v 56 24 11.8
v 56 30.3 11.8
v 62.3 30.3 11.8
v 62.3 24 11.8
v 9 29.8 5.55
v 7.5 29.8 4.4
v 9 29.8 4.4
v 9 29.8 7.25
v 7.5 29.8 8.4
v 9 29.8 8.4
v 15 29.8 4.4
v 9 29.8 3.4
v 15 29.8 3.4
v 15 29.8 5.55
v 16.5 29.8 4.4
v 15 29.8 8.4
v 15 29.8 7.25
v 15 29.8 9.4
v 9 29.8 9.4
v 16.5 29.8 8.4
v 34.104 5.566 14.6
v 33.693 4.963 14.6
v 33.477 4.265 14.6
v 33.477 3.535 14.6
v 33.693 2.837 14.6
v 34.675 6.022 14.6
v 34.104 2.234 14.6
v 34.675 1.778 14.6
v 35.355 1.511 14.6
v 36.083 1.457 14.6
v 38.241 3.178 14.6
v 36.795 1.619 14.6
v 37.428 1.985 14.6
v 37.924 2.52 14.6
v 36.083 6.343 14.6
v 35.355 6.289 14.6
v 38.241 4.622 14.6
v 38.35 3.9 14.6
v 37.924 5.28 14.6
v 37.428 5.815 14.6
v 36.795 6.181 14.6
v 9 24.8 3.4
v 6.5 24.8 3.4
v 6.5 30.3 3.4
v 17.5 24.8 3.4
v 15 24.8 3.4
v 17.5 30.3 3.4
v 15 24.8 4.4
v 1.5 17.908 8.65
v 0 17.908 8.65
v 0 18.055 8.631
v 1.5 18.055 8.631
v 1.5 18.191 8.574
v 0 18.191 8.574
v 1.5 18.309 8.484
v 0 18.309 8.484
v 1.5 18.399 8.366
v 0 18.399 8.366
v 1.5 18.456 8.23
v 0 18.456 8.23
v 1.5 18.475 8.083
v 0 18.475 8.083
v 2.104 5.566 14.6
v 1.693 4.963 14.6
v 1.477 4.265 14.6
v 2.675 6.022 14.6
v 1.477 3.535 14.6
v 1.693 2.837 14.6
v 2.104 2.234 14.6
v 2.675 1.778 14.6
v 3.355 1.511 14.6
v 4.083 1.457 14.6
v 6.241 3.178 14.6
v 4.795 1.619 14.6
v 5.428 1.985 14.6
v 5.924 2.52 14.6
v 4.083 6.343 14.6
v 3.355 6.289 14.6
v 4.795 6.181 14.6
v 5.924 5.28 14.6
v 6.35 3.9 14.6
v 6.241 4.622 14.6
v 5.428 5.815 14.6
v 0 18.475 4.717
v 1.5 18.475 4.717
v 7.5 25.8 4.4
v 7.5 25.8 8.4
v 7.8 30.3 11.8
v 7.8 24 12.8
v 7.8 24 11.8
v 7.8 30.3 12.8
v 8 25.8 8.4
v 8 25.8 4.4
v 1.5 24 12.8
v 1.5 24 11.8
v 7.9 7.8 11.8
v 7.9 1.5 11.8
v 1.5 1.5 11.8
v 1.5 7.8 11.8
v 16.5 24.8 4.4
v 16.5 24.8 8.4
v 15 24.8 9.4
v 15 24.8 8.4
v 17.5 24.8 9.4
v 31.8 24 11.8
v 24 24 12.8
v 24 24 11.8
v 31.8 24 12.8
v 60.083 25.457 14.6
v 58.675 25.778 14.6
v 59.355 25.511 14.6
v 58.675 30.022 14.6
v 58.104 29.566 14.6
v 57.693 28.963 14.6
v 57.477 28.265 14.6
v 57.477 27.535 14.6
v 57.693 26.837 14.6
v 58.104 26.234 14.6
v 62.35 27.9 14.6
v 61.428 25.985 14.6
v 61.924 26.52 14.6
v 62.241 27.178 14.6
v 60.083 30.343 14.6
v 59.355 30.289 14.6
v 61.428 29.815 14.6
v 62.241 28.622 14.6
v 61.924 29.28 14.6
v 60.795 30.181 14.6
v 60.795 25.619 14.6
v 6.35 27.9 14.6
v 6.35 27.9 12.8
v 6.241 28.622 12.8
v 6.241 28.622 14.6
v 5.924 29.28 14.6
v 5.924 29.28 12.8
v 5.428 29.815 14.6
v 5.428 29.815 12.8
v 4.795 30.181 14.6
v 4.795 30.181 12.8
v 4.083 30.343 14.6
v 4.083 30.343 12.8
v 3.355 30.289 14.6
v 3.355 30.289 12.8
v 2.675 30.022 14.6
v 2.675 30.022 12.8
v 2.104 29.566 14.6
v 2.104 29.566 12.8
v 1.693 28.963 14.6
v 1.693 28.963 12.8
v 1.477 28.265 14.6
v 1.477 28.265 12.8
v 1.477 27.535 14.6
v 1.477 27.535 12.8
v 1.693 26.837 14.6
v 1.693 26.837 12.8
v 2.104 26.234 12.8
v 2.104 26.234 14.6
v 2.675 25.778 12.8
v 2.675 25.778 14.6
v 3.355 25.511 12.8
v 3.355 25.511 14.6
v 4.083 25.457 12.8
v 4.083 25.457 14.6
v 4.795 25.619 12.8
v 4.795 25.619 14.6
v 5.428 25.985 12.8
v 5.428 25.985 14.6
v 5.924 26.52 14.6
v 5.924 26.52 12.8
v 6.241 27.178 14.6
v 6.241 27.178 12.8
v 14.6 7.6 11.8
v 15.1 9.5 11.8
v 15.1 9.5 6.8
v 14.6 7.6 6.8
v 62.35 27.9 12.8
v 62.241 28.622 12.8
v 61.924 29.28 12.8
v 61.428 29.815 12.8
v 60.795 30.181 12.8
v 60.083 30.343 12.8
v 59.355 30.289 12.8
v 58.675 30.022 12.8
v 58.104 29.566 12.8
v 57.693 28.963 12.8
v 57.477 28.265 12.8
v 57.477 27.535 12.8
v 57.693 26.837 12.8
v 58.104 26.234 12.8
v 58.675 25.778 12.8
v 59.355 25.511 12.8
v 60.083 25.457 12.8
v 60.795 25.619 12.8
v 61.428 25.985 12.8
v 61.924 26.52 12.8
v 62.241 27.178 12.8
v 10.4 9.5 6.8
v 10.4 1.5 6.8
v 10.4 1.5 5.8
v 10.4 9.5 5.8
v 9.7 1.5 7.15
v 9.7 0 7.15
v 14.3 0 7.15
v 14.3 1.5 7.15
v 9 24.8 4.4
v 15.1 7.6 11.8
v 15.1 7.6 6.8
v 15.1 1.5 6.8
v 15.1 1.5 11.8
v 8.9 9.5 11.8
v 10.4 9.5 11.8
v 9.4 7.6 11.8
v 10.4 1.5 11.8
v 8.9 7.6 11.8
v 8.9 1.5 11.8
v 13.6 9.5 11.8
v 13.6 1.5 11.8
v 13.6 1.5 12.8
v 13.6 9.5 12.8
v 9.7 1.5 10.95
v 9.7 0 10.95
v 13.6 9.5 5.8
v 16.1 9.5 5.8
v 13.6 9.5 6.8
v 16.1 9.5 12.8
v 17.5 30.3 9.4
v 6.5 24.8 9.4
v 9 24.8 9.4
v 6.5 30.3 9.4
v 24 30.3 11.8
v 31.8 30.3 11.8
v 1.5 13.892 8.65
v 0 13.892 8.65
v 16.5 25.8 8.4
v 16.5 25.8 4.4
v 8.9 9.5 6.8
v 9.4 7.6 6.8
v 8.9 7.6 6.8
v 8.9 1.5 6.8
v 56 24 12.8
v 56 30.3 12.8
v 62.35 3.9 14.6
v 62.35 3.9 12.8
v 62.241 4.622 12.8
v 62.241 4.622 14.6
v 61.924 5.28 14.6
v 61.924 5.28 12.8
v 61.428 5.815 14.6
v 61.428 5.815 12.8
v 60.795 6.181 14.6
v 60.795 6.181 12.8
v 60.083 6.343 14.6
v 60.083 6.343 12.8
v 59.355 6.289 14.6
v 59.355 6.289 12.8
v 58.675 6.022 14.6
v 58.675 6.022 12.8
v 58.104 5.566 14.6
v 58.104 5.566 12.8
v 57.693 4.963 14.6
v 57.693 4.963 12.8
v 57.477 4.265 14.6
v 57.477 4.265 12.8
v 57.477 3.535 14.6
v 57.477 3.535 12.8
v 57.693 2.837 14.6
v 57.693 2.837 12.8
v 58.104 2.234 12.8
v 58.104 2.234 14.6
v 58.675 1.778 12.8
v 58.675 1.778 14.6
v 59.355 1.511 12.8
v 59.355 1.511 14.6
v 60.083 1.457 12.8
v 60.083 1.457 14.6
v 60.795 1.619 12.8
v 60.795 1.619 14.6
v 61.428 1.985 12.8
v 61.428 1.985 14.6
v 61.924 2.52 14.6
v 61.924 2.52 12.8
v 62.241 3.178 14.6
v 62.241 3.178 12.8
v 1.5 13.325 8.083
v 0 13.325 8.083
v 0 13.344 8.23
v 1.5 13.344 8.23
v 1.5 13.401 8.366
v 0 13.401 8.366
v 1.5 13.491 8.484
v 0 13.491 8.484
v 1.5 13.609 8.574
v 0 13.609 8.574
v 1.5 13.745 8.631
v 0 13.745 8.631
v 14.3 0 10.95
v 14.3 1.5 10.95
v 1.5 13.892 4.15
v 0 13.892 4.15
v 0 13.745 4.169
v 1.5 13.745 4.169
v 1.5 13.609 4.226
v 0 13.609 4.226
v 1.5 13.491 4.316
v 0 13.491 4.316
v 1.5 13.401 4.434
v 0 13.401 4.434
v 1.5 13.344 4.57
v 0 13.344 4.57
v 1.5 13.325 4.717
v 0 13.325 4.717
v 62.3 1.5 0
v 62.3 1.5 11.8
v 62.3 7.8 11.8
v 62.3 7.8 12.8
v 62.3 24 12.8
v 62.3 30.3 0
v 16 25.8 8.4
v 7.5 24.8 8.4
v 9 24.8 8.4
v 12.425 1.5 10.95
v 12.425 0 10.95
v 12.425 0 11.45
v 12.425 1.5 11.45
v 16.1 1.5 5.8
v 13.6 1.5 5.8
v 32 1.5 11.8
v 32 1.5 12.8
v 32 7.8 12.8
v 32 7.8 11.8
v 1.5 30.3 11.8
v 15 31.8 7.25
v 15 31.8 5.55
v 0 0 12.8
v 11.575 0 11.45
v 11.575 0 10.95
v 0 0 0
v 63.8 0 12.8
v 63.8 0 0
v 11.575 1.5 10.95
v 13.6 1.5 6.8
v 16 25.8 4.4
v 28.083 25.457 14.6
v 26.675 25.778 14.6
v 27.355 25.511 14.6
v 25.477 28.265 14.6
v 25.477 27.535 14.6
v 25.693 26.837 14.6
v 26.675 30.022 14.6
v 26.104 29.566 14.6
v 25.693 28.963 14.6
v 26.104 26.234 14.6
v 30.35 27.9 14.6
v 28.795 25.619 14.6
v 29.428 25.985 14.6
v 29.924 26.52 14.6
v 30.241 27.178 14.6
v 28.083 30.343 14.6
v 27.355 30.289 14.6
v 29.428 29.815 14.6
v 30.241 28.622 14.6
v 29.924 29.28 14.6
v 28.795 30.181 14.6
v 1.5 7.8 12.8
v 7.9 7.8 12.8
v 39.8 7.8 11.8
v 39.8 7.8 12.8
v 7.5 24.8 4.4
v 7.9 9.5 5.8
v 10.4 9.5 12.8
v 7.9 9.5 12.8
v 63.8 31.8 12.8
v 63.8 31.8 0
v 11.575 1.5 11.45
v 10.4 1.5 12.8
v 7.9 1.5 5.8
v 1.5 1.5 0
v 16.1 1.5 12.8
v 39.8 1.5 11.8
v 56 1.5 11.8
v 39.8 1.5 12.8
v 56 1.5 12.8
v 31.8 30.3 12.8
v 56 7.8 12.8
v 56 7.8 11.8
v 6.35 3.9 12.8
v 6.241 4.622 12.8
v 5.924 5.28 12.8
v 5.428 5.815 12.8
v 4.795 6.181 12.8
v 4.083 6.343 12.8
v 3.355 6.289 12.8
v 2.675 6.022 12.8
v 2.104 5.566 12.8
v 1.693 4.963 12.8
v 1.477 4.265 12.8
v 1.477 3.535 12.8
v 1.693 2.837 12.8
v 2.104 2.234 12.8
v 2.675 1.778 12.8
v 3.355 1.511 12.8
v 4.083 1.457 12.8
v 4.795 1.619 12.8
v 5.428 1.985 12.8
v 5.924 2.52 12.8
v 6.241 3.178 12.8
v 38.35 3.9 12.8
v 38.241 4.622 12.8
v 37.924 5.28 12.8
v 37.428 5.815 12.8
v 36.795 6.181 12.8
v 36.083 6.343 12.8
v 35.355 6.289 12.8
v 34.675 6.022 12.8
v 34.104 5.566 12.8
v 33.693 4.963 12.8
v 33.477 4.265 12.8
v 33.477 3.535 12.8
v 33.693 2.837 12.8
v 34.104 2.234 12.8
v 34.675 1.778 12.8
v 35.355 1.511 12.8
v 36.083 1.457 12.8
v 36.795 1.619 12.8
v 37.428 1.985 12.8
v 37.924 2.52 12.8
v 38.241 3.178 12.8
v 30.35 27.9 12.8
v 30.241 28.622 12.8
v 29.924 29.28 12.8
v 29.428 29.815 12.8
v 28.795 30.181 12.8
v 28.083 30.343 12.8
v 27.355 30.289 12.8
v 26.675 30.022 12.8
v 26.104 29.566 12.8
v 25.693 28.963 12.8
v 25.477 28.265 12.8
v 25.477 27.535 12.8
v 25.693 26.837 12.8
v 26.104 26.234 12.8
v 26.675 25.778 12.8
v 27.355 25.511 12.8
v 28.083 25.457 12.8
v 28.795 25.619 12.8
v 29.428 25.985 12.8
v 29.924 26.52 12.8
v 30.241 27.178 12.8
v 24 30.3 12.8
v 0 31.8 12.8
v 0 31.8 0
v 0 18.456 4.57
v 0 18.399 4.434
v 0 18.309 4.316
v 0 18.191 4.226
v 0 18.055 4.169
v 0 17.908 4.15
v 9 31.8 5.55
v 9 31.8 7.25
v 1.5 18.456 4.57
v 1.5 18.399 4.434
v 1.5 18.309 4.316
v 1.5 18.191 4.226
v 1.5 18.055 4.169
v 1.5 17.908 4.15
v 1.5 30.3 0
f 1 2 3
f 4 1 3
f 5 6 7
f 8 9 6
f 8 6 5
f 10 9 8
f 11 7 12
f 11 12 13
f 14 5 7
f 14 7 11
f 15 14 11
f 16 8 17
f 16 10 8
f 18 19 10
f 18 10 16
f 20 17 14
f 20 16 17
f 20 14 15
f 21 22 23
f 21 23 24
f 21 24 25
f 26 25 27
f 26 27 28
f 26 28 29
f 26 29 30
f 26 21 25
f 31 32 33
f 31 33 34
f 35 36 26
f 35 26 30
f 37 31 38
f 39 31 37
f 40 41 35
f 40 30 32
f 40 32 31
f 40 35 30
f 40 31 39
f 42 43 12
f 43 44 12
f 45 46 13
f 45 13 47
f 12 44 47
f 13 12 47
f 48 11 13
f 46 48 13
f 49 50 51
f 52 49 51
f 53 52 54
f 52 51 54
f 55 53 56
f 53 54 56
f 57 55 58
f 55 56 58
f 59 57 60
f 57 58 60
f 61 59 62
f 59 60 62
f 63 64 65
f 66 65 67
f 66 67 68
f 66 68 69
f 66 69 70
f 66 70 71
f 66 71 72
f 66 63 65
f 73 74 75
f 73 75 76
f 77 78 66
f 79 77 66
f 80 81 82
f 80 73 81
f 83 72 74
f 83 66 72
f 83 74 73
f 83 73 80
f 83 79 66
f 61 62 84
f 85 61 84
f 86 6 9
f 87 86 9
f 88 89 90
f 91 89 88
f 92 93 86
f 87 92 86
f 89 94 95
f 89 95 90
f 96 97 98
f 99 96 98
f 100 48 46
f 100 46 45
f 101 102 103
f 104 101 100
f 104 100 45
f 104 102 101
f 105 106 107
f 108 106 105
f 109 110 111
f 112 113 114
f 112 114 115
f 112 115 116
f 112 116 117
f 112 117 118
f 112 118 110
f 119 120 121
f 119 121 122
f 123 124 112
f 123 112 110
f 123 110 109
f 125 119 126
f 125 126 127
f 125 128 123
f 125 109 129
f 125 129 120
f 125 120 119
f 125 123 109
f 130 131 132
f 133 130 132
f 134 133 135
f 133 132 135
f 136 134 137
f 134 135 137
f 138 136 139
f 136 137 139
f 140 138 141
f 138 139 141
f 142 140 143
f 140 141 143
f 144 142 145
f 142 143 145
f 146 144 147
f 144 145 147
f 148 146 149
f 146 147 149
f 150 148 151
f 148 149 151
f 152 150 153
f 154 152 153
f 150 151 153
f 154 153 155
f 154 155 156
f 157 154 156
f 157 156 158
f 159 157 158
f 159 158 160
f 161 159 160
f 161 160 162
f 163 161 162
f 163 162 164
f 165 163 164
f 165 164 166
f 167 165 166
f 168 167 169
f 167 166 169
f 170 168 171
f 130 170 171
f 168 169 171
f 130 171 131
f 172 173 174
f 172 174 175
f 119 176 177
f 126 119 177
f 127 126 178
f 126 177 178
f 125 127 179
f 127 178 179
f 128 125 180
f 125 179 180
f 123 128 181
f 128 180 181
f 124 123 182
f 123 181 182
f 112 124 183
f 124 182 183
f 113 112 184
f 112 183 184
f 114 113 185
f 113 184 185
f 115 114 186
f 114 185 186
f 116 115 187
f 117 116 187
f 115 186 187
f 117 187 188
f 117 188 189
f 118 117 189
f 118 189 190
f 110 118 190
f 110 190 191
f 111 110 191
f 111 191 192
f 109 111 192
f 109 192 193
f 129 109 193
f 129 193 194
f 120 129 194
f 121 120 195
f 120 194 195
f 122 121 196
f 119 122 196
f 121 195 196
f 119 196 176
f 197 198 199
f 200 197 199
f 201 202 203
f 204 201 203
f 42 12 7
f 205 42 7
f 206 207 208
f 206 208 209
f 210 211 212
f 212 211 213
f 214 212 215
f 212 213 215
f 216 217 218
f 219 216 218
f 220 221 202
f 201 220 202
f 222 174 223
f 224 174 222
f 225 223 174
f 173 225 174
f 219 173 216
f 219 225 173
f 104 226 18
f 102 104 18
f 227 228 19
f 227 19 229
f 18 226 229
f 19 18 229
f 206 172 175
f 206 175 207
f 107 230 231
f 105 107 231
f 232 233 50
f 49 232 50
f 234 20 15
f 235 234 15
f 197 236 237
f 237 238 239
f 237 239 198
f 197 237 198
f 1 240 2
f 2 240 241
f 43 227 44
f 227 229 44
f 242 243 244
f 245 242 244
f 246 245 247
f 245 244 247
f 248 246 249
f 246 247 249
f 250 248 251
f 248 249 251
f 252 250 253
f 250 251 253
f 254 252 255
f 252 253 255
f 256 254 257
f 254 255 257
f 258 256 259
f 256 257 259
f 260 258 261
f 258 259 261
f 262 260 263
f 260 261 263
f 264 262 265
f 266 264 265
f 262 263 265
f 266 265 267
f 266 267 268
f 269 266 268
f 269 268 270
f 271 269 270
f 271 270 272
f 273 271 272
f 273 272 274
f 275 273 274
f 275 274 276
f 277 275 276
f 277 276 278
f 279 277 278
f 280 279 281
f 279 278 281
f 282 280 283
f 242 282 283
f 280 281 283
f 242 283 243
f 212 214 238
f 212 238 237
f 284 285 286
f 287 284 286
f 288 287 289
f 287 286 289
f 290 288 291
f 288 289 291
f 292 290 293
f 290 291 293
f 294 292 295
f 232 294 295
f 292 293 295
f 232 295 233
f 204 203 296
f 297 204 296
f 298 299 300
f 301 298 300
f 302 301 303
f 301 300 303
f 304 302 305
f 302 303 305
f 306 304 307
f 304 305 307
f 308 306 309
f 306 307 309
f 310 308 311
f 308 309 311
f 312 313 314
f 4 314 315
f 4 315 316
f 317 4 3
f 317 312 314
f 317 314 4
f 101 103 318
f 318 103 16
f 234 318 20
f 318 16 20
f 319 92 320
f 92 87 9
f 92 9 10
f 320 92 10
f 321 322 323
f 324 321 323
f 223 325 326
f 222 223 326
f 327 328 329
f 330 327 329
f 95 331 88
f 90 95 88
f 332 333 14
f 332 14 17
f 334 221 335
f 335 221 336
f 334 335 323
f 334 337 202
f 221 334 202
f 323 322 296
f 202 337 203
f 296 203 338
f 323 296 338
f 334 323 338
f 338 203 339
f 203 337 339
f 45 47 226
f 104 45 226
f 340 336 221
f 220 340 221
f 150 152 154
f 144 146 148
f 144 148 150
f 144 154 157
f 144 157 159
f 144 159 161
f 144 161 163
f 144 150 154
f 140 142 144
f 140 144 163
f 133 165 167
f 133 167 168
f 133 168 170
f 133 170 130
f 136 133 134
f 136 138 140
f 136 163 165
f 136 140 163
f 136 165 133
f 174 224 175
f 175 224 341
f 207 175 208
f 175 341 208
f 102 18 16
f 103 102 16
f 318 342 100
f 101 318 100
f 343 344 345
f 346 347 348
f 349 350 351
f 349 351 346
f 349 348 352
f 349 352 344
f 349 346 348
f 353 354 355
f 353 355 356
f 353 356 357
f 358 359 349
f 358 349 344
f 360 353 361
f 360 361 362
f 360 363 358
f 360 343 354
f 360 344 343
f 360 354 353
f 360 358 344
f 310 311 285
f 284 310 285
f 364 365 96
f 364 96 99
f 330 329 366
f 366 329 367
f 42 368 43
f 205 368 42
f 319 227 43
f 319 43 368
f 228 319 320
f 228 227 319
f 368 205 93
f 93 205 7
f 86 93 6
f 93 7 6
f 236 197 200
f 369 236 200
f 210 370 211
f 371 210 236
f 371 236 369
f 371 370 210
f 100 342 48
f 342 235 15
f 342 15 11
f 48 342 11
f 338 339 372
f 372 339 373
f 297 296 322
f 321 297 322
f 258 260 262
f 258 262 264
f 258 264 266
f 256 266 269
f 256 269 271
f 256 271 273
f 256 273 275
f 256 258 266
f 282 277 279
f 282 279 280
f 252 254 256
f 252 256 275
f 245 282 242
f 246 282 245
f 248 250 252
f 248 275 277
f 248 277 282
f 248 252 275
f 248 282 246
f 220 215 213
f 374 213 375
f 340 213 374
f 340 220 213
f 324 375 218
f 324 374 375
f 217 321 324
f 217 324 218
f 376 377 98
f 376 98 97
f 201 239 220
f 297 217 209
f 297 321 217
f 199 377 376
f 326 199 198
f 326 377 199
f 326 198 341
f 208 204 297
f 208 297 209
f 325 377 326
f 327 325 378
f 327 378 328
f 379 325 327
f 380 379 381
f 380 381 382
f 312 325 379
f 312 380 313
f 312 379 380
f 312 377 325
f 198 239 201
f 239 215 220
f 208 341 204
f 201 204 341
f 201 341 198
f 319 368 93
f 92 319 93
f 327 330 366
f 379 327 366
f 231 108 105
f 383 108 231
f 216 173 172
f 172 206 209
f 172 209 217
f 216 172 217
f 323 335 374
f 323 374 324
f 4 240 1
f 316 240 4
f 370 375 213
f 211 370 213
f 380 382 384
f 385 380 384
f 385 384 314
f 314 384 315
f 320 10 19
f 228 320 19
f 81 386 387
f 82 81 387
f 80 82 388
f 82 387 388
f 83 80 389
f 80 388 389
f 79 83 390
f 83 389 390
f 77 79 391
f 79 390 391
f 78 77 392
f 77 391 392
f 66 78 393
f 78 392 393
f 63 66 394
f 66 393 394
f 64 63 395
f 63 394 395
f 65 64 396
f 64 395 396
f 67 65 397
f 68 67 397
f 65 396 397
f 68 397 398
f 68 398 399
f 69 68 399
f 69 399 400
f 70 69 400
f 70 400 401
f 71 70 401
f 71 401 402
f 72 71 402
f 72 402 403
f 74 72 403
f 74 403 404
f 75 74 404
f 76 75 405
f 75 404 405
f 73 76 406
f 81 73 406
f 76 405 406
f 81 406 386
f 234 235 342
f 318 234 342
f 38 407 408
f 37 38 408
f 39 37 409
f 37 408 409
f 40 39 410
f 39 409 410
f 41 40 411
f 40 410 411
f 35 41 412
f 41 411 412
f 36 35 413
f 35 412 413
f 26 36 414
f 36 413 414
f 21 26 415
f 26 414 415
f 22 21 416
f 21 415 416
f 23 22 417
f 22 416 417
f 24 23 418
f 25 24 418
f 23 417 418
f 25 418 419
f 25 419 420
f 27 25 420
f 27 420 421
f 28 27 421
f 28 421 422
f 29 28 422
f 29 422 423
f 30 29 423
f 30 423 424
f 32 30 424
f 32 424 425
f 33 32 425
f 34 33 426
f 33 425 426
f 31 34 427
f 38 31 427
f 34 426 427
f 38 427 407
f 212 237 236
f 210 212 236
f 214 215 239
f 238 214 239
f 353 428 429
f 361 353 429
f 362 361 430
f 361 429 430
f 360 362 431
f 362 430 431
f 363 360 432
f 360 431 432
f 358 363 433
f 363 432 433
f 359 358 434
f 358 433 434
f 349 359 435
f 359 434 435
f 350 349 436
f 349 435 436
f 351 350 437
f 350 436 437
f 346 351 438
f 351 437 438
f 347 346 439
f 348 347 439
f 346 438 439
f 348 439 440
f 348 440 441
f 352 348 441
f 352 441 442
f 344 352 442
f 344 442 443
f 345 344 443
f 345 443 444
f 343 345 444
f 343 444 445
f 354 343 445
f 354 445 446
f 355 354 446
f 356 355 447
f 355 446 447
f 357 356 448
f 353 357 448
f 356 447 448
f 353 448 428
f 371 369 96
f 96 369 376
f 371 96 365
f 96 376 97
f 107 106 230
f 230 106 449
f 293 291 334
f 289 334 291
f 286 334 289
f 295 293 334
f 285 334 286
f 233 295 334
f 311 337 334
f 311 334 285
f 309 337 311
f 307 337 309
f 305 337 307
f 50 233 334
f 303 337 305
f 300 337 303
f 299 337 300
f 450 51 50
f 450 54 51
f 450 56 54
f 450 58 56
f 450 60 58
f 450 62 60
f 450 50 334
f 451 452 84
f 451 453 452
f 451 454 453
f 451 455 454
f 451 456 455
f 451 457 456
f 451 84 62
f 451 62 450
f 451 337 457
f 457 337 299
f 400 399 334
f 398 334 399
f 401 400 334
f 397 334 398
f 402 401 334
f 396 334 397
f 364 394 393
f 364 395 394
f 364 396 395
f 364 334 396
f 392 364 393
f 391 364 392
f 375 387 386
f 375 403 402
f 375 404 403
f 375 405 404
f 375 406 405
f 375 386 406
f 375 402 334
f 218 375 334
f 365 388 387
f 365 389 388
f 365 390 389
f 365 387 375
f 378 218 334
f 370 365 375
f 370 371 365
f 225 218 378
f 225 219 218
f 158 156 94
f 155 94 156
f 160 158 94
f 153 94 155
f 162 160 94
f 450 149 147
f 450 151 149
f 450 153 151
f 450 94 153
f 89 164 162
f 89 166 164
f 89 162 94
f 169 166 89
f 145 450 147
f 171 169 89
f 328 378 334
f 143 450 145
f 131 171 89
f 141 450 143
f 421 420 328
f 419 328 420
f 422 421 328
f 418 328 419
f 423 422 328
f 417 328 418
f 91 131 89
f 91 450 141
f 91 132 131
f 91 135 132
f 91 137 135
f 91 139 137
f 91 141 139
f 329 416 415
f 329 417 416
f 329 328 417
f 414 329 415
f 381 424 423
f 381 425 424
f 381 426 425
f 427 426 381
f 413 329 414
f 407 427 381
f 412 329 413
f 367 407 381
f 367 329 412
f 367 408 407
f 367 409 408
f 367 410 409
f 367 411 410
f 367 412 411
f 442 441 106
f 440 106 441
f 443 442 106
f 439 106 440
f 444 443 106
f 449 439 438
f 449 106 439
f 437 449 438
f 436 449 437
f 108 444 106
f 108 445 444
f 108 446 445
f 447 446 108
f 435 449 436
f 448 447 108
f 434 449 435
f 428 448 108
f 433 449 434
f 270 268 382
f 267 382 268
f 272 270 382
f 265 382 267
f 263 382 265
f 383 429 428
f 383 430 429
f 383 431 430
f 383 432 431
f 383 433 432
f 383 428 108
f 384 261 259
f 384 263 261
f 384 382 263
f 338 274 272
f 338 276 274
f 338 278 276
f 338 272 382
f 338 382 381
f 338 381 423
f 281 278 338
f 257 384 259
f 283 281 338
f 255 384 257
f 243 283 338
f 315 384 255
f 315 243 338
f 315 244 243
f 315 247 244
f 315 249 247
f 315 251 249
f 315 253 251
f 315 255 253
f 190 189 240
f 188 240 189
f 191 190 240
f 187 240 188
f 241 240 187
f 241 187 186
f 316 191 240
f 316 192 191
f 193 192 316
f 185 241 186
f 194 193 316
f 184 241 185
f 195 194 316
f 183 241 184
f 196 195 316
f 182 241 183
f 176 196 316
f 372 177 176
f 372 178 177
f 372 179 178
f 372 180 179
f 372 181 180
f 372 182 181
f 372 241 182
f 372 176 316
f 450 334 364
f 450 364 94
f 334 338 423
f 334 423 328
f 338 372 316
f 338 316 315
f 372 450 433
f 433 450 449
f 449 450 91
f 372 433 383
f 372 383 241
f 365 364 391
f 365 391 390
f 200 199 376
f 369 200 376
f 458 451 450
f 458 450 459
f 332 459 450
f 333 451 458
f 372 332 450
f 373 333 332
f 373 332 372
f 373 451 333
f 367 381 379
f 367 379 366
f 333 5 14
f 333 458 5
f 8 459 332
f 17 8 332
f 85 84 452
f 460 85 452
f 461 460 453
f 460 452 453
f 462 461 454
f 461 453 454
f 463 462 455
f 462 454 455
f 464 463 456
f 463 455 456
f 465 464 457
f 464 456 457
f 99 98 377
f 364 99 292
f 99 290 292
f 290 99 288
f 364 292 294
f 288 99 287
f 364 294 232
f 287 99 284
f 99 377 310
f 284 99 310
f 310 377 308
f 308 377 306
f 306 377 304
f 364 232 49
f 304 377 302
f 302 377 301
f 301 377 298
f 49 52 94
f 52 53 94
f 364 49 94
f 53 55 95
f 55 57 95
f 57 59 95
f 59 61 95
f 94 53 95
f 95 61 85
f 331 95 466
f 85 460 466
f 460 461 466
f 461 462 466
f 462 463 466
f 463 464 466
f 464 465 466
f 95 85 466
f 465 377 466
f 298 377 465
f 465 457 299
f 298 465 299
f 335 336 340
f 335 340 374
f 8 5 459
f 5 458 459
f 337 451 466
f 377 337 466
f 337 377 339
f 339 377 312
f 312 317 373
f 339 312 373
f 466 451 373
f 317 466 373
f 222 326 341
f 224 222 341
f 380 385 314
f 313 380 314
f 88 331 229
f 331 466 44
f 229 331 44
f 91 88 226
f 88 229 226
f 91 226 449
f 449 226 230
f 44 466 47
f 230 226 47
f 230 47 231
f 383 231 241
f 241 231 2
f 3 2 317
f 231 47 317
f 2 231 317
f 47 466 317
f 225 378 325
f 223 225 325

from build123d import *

# Parameters (mm, degrees)
F0_W      = 63.8
F0_H      = 31.8
F0_W_2    = 60.8
F0_H_2    = 28.8
F1_DEPTH  = 12.8
F2_W      = 6.3
F2_H      = 6.3
F2_W_2    = 7.8
F3_DEPTH  = 1
F4_R      = 2.45
F5_DEPTH  = 1.8
F6_W      = 0.85
F6_H      = 0.5
F7_DEPTH  = 25.4
F9_DEPTH  = 8
F11_DEPTH = 5
F12_W     = 0.1
F12_H     = 1
F13_DEPTH = 6.3
F14_W     = 6
F14_H     = 1.7
F15_DEPTH = 2.54
F16_W     = 11
F16_H     = 6
F16_W_2   = 6
F16_H_2   = 1.7
F17_DEPTH = 0.5
F19_DEPTH = 5
F21_DEPTH = 4
F23_DEPTH = 25.4


# Not quite as in the source:
# - a feature names something its author has since deleted; it is built from what else it names


with BuildPart() as f1:
    # F0 (on Top) → F1 (new body)
    with BuildSketch(Plane.XY):
        with Locations((31.9, 15.9)):
            Rectangle(F0_W, F0_H)
        with Locations((31.9, 15.9)):
            Rectangle(F0_W_2, F0_H_2, mode=Mode.SUBTRACT)
    extrude(amount=F1_DEPTH)

    # F2 (on face) → F3 (join)
    with BuildSketch(Plane.XY.offset(12.8)):
        with Locations((4.65, 27.15)):
            Rectangle(F2_W, F2_H)
        with Locations((4.65, 4.65)):
            Rectangle(F2_W, F2_H)
        with Locations((59.15, 4.65)):
            Rectangle(F2_W, F2_H)
        with Locations((59.15, 27.15)):
            Rectangle(F2_W, F2_H)
        with Locations((27.9, 27.15)):
            Rectangle(F2_W_2, F2_H)
        with Locations((35.9, 4.65)):
            Rectangle(F2_W_2, F2_H)
    extrude(amount=-F3_DEPTH)

    # F4 (on face) → F5 (join)
    with BuildSketch(Plane.XY.offset(12.8)):
        with Locations((3.9, 27.9)):
            Circle(F4_R)
        with Locations((59.9, 27.9)):
            Circle(F4_R)
        with Locations((59.9, 3.9)):
            Circle(F4_R)
        with Locations((3.9, 3.9)):
            Circle(F4_R)
        with Locations((27.9, 27.9)):
            Circle(F4_R)
        with Locations((35.9, 3.9)):
            Circle(F4_R)
    extrude(amount=F5_DEPTH)

    # F6 (on face) → F7 (cut)
    with BuildSketch(Plane.XZ):
        Polygon((11.575, 10.95), (9.7, 10.95), (9.7, 7.15), (14.3, 7.15), (14.3, 10.95), (12.425, 10.95), align=None)
        with Locations((12, 11.2)):
            Rectangle(F6_W, F6_H)
    extrude(amount=-F7_DEPTH, mode=Mode.SUBTRACT)

    # F8 (on face) → F9 (join)
    with BuildSketch(Plane(origin=(0, 1.5, 0), x_dir=(-1, 0, 0), z_dir=(0, 1, 0))):
        Polygon((-13.6, 5.8), (-13.6, 6.8), (-15.1, 6.8), (-15.1, 11.8), (-13.6, 11.8), (-13.6, 12.8), (-16.1, 12.8), (-16.1, 5.8), align=None)
        Polygon((-8.9, 6.8), (-10.4, 6.8), (-10.4, 5.8), (-7.9, 5.8), (-7.9, 12.8), (-10.4, 12.8), (-10.4, 11.8), (-8.9, 11.8), align=None)
    extrude(amount=F9_DEPTH)

    # F10 (on face) → F11 (join, through all)
    with BuildSketch(Plane.XY.offset(6.8)):
        Polygon((14.6, 7.6), (15.1, 7.6), (15.1, 9.5), align=None)
        Polygon((9.4, 7.6), (8.9, 9.5), (8.9, 7.6), align=None)
    extrude(amount=F11_DEPTH)

    # F12 (on face) → F13 (join, through all)
    with BuildSketch(Plane(origin=(0, 1.5, 0), x_dir=(-1, 0, 0), z_dir=(0, 1, 0))):
        with Locations((-7.85, 12.3)):
            Rectangle(F12_W, F12_H)
    extrude(amount=F13_DEPTH)

    # F14 (on face) → F15 (cut)
    with BuildSketch(Plane(origin=(0, 31.8, 0), x_dir=(-1, 0, 0), z_dir=(0, 1, 0))):
        with Locations((-12, 6.4)):
            Rectangle(F14_W, F14_H)
    extrude(amount=-F15_DEPTH, mode=Mode.SUBTRACT)

    # F16 (on face) → F17 (join)
    with BuildSketch(Plane.XZ.offset(-30.3)):
        with Locations((12, 6.4)):
            Rectangle(F16_W, F16_H)
        with Locations((12, 6.4)):
            Rectangle(F16_W_2, F16_H_2, mode=Mode.SUBTRACT)
    extrude(amount=F17_DEPTH)

    # F18 (on face) → F19 (join)
    with BuildSketch(Plane.XZ.offset(-29.8)):
        Polygon((9, 9.4), (6.5, 9.4), (6.5, 3.4), (9, 3.4), (9, 4.4), (7.5, 4.4), (7.5, 8.4), (9, 8.4), align=None)
        Polygon((17.5, 9.4), (15, 9.4), (15, 8.4), (16.5, 8.4), (16.5, 4.4), (15, 4.4), (15, 3.4), (17.5, 3.4), align=None)
    extrude(amount=F19_DEPTH)

    # F20 (on face) → F21 (join, through all)
    with BuildSketch(Plane.XY.offset(4.4)):
        Polygon((7.5, 25.8), (7.5, 24.8), (8, 25.8), align=None)
        Polygon((16, 25.8), (16.5, 24.8), (16.5, 25.8), align=None)
    extrude(amount=F21_DEPTH)

    # F22 (on face) → F23 (cut)
    with BuildSketch(Plane(origin=(0, 0, 0), x_dir=(0, -1, 0), z_dir=(-1, 0, 0))):
        with BuildLine():
            Line((-13.8921684574, 8.65), (-17.9078315426, 8.65))
            ThreePointArc((-17.9078315426, 8.65), (-18.3088802049, 8.4838802049), (-18.475, 8.0828315426))
            Line((-18.475, 8.0828315426), (-18.475, 4.7171684574))
            ThreePointArc((-18.475, 4.7171684574), (-18.3088802049, 4.3161197951), (-17.9078315426, 4.15))
            Line((-17.9078315426, 4.15), (-13.8921684574, 4.15))
            ThreePointArc((-13.8921684574, 4.15), (-13.4911197951, 4.3161197951), (-13.325, 4.7171684574))
            Line((-13.325, 4.7171684574), (-13.325, 8.0828315426))
            ThreePointArc((-13.325, 8.0828315426), (-13.4911197951, 8.4838802049), (-13.8921684574, 8.65))
        make_face()
    extrude(amount=-F23_DEPTH, mode=Mode.SUBTRACT)


solid = f1.part
